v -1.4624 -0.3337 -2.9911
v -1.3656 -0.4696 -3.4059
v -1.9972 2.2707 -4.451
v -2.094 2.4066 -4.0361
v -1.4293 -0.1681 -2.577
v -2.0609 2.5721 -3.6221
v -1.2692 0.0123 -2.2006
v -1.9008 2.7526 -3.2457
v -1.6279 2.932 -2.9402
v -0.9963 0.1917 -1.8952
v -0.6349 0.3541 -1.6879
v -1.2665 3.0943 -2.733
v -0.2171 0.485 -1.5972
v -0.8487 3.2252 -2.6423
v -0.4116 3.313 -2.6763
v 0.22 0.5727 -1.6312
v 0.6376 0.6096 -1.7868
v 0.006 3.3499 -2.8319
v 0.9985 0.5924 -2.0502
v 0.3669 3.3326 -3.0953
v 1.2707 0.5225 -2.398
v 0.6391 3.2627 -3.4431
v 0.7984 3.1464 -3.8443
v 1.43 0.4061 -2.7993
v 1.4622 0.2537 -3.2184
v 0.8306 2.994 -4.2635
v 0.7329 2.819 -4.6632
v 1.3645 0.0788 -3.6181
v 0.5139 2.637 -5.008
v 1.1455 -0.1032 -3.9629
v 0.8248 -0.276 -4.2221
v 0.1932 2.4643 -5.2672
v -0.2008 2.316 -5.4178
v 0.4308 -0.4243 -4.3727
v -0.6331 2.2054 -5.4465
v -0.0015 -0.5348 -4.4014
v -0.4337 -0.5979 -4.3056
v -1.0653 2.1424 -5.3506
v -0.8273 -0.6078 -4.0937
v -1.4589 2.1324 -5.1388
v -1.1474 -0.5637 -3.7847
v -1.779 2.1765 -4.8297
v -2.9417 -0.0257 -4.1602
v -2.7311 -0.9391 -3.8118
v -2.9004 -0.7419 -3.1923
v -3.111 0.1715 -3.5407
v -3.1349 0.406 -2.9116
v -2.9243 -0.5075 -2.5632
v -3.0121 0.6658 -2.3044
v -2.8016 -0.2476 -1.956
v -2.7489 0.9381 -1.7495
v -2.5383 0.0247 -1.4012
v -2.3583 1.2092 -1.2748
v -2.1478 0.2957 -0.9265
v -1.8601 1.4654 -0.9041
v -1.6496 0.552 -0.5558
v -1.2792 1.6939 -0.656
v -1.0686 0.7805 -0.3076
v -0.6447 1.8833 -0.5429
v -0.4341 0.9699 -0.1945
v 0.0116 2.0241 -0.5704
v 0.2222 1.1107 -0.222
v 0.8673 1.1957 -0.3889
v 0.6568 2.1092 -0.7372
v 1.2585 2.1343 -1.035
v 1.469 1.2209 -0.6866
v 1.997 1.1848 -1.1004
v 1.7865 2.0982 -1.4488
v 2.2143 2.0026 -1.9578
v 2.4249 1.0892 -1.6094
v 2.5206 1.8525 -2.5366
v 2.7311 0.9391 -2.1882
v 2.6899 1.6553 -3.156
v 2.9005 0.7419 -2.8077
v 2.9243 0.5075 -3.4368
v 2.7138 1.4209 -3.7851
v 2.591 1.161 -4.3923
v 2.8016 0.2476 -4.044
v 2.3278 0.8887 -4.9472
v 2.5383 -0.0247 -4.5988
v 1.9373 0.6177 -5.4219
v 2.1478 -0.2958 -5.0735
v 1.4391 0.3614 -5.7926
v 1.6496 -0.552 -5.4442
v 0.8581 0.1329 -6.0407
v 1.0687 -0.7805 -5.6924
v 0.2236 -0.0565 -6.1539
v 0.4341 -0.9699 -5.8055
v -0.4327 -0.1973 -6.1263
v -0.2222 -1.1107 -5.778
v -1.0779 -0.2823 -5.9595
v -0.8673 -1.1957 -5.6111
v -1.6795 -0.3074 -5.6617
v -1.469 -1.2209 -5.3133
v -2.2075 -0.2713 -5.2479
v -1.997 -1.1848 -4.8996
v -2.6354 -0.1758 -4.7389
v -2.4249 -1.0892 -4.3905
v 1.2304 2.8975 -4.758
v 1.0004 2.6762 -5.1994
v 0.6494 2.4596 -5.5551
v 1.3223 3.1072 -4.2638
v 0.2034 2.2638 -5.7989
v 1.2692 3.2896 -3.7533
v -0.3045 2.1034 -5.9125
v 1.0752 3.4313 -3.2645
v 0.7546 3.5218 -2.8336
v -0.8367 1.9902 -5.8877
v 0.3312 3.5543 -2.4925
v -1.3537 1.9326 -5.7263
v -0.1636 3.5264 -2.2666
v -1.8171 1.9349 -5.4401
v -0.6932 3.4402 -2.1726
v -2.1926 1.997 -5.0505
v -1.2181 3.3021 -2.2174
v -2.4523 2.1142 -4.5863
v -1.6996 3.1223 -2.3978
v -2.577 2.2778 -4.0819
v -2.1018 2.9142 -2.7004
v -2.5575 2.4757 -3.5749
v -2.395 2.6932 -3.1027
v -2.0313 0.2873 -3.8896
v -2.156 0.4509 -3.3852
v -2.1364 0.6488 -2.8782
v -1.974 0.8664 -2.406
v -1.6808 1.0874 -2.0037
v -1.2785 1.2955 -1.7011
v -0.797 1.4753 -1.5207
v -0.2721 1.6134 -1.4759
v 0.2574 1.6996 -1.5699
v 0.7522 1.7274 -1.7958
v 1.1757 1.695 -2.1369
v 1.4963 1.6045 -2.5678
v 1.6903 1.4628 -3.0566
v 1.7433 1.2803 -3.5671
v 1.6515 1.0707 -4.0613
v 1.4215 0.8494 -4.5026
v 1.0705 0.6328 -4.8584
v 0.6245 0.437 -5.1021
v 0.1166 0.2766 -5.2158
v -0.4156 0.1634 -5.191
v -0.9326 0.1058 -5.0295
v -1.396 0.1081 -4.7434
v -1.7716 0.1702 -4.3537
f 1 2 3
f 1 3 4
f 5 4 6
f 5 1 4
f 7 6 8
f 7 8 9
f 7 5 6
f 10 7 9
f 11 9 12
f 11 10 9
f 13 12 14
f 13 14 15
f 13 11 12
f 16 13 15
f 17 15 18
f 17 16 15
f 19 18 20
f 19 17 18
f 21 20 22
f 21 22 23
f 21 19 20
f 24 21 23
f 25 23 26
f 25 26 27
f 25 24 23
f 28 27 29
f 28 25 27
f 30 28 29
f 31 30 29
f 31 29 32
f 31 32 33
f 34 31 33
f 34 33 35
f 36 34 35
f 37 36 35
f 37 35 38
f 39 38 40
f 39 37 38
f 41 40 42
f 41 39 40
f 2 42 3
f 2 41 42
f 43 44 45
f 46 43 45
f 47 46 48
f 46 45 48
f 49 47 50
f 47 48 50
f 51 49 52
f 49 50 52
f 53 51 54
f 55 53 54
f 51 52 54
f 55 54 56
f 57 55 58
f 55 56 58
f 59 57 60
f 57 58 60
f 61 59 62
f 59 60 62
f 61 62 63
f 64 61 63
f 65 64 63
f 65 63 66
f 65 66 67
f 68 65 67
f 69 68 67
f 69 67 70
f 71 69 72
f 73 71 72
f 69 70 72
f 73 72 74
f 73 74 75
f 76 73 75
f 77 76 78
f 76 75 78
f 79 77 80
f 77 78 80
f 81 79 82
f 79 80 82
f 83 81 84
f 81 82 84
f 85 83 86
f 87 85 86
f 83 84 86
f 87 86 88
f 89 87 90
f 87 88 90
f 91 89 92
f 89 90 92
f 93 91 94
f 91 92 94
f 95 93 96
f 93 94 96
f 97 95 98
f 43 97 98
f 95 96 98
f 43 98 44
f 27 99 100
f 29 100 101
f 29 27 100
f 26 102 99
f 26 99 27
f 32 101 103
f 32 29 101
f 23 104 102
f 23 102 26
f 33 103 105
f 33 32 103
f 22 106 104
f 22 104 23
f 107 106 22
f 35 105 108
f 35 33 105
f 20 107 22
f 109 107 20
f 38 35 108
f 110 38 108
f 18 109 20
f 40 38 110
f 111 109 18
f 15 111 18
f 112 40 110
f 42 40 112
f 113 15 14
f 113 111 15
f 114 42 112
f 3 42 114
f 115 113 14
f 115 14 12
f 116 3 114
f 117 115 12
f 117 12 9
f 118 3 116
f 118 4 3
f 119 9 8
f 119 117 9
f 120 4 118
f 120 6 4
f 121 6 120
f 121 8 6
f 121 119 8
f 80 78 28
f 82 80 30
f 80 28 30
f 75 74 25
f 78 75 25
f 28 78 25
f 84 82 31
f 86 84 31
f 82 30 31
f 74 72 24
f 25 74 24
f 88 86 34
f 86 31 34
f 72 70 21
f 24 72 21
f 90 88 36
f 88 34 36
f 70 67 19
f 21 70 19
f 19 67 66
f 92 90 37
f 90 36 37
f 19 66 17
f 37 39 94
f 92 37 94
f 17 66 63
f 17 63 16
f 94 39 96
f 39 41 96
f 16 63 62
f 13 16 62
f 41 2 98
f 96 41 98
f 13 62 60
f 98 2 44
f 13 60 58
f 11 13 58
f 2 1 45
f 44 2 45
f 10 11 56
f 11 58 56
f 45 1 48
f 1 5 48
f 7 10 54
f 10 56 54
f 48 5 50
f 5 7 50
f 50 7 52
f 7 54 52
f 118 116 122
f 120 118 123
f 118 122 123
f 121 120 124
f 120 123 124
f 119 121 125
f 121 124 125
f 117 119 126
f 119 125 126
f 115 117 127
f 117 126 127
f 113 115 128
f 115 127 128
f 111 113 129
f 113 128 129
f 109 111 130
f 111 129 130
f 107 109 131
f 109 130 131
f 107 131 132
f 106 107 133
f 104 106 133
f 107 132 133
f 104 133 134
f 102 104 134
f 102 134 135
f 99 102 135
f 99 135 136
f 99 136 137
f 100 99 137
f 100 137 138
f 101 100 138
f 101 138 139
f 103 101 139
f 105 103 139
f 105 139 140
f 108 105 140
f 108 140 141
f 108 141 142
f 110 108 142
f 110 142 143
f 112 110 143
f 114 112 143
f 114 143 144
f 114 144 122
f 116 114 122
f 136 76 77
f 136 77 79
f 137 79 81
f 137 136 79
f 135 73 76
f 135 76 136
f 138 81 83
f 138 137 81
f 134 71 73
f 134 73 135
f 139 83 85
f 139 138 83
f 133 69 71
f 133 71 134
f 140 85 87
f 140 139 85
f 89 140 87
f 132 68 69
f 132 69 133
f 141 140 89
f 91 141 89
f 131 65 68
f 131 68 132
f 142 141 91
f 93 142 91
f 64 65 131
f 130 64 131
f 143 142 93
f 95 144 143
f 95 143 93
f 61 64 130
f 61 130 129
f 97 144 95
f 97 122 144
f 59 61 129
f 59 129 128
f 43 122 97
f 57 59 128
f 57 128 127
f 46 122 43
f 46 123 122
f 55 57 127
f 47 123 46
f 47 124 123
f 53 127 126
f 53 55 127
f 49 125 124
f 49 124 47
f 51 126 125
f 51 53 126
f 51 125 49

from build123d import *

# Parameters (mm, degrees)
CYLINDER026_R          = 1.5
CYLINDER026_DEPTH      = 3
CYLINDER025_R          = 2
CYLINDER025_DEPTH      = 3
CYLINDER024_R          = 3
CYLINDER024_DEPTH      = 1
CUT033_ROLL_ANGLE      = 111.214464
CUT033_PITCH_ANGLE     = 15.699901
CUT033_PLACEMENT_ANGLE = -161.024378


with BuildPart() as cylinder030:
    # Cylinder026 → Cylinder026 (new body)
    with BuildSketch(Plane.XY):
        Circle(CYLINDER026_R)
    extrude(amount=CYLINDER026_DEPTH)


with BuildPart() as cylinder029:
    # Cylinder025 → Cylinder025 (new body)
    with BuildSketch(Plane.XY):
        Circle(CYLINDER025_R)
    extrude(amount=CYLINDER025_DEPTH)


with BuildPart() as f_3mmlager:
    # Cylinder024 → Cylinder024 (new body)
    with BuildSketch(Plane.XY):
        Circle(CYLINDER024_R)
    extrude(amount=CYLINDER024_DEPTH)

    # Fusion026: union Cylinder029
    add(cylinder029.part)

    # Cut033: cut Cylinder030
    add(cylinder030.part, mode=Mode.SUBTRACT)


with BuildPart() as f_3mmlager_1:
    # Cut033 roll: moved
    add(f_3mmlager.part.rotate(Axis((0, 0, 0), (1, 0, 0)), CUT033_ROLL_ANGLE))


with BuildPart() as f_3mmlager_2:
    # Cut033 pitch: moved
    add(f_3mmlager_1.part.rotate(Axis((0, 0, 0), (0, 1, 0)), CUT033_PITCH_ANGLE))


with BuildPart() as f_3mmlager_3:
    # Cut033 placement: moved
    add(f_3mmlager_2.part.moved(Location((3e-06, -2e-06, -2.999996))).rotate(Axis((3e-06, -2e-06, -2.999996), (0, 0, 1)), CUT033_PLACEMENT_ANGLE))


solid = f_3mmlager_3.part
